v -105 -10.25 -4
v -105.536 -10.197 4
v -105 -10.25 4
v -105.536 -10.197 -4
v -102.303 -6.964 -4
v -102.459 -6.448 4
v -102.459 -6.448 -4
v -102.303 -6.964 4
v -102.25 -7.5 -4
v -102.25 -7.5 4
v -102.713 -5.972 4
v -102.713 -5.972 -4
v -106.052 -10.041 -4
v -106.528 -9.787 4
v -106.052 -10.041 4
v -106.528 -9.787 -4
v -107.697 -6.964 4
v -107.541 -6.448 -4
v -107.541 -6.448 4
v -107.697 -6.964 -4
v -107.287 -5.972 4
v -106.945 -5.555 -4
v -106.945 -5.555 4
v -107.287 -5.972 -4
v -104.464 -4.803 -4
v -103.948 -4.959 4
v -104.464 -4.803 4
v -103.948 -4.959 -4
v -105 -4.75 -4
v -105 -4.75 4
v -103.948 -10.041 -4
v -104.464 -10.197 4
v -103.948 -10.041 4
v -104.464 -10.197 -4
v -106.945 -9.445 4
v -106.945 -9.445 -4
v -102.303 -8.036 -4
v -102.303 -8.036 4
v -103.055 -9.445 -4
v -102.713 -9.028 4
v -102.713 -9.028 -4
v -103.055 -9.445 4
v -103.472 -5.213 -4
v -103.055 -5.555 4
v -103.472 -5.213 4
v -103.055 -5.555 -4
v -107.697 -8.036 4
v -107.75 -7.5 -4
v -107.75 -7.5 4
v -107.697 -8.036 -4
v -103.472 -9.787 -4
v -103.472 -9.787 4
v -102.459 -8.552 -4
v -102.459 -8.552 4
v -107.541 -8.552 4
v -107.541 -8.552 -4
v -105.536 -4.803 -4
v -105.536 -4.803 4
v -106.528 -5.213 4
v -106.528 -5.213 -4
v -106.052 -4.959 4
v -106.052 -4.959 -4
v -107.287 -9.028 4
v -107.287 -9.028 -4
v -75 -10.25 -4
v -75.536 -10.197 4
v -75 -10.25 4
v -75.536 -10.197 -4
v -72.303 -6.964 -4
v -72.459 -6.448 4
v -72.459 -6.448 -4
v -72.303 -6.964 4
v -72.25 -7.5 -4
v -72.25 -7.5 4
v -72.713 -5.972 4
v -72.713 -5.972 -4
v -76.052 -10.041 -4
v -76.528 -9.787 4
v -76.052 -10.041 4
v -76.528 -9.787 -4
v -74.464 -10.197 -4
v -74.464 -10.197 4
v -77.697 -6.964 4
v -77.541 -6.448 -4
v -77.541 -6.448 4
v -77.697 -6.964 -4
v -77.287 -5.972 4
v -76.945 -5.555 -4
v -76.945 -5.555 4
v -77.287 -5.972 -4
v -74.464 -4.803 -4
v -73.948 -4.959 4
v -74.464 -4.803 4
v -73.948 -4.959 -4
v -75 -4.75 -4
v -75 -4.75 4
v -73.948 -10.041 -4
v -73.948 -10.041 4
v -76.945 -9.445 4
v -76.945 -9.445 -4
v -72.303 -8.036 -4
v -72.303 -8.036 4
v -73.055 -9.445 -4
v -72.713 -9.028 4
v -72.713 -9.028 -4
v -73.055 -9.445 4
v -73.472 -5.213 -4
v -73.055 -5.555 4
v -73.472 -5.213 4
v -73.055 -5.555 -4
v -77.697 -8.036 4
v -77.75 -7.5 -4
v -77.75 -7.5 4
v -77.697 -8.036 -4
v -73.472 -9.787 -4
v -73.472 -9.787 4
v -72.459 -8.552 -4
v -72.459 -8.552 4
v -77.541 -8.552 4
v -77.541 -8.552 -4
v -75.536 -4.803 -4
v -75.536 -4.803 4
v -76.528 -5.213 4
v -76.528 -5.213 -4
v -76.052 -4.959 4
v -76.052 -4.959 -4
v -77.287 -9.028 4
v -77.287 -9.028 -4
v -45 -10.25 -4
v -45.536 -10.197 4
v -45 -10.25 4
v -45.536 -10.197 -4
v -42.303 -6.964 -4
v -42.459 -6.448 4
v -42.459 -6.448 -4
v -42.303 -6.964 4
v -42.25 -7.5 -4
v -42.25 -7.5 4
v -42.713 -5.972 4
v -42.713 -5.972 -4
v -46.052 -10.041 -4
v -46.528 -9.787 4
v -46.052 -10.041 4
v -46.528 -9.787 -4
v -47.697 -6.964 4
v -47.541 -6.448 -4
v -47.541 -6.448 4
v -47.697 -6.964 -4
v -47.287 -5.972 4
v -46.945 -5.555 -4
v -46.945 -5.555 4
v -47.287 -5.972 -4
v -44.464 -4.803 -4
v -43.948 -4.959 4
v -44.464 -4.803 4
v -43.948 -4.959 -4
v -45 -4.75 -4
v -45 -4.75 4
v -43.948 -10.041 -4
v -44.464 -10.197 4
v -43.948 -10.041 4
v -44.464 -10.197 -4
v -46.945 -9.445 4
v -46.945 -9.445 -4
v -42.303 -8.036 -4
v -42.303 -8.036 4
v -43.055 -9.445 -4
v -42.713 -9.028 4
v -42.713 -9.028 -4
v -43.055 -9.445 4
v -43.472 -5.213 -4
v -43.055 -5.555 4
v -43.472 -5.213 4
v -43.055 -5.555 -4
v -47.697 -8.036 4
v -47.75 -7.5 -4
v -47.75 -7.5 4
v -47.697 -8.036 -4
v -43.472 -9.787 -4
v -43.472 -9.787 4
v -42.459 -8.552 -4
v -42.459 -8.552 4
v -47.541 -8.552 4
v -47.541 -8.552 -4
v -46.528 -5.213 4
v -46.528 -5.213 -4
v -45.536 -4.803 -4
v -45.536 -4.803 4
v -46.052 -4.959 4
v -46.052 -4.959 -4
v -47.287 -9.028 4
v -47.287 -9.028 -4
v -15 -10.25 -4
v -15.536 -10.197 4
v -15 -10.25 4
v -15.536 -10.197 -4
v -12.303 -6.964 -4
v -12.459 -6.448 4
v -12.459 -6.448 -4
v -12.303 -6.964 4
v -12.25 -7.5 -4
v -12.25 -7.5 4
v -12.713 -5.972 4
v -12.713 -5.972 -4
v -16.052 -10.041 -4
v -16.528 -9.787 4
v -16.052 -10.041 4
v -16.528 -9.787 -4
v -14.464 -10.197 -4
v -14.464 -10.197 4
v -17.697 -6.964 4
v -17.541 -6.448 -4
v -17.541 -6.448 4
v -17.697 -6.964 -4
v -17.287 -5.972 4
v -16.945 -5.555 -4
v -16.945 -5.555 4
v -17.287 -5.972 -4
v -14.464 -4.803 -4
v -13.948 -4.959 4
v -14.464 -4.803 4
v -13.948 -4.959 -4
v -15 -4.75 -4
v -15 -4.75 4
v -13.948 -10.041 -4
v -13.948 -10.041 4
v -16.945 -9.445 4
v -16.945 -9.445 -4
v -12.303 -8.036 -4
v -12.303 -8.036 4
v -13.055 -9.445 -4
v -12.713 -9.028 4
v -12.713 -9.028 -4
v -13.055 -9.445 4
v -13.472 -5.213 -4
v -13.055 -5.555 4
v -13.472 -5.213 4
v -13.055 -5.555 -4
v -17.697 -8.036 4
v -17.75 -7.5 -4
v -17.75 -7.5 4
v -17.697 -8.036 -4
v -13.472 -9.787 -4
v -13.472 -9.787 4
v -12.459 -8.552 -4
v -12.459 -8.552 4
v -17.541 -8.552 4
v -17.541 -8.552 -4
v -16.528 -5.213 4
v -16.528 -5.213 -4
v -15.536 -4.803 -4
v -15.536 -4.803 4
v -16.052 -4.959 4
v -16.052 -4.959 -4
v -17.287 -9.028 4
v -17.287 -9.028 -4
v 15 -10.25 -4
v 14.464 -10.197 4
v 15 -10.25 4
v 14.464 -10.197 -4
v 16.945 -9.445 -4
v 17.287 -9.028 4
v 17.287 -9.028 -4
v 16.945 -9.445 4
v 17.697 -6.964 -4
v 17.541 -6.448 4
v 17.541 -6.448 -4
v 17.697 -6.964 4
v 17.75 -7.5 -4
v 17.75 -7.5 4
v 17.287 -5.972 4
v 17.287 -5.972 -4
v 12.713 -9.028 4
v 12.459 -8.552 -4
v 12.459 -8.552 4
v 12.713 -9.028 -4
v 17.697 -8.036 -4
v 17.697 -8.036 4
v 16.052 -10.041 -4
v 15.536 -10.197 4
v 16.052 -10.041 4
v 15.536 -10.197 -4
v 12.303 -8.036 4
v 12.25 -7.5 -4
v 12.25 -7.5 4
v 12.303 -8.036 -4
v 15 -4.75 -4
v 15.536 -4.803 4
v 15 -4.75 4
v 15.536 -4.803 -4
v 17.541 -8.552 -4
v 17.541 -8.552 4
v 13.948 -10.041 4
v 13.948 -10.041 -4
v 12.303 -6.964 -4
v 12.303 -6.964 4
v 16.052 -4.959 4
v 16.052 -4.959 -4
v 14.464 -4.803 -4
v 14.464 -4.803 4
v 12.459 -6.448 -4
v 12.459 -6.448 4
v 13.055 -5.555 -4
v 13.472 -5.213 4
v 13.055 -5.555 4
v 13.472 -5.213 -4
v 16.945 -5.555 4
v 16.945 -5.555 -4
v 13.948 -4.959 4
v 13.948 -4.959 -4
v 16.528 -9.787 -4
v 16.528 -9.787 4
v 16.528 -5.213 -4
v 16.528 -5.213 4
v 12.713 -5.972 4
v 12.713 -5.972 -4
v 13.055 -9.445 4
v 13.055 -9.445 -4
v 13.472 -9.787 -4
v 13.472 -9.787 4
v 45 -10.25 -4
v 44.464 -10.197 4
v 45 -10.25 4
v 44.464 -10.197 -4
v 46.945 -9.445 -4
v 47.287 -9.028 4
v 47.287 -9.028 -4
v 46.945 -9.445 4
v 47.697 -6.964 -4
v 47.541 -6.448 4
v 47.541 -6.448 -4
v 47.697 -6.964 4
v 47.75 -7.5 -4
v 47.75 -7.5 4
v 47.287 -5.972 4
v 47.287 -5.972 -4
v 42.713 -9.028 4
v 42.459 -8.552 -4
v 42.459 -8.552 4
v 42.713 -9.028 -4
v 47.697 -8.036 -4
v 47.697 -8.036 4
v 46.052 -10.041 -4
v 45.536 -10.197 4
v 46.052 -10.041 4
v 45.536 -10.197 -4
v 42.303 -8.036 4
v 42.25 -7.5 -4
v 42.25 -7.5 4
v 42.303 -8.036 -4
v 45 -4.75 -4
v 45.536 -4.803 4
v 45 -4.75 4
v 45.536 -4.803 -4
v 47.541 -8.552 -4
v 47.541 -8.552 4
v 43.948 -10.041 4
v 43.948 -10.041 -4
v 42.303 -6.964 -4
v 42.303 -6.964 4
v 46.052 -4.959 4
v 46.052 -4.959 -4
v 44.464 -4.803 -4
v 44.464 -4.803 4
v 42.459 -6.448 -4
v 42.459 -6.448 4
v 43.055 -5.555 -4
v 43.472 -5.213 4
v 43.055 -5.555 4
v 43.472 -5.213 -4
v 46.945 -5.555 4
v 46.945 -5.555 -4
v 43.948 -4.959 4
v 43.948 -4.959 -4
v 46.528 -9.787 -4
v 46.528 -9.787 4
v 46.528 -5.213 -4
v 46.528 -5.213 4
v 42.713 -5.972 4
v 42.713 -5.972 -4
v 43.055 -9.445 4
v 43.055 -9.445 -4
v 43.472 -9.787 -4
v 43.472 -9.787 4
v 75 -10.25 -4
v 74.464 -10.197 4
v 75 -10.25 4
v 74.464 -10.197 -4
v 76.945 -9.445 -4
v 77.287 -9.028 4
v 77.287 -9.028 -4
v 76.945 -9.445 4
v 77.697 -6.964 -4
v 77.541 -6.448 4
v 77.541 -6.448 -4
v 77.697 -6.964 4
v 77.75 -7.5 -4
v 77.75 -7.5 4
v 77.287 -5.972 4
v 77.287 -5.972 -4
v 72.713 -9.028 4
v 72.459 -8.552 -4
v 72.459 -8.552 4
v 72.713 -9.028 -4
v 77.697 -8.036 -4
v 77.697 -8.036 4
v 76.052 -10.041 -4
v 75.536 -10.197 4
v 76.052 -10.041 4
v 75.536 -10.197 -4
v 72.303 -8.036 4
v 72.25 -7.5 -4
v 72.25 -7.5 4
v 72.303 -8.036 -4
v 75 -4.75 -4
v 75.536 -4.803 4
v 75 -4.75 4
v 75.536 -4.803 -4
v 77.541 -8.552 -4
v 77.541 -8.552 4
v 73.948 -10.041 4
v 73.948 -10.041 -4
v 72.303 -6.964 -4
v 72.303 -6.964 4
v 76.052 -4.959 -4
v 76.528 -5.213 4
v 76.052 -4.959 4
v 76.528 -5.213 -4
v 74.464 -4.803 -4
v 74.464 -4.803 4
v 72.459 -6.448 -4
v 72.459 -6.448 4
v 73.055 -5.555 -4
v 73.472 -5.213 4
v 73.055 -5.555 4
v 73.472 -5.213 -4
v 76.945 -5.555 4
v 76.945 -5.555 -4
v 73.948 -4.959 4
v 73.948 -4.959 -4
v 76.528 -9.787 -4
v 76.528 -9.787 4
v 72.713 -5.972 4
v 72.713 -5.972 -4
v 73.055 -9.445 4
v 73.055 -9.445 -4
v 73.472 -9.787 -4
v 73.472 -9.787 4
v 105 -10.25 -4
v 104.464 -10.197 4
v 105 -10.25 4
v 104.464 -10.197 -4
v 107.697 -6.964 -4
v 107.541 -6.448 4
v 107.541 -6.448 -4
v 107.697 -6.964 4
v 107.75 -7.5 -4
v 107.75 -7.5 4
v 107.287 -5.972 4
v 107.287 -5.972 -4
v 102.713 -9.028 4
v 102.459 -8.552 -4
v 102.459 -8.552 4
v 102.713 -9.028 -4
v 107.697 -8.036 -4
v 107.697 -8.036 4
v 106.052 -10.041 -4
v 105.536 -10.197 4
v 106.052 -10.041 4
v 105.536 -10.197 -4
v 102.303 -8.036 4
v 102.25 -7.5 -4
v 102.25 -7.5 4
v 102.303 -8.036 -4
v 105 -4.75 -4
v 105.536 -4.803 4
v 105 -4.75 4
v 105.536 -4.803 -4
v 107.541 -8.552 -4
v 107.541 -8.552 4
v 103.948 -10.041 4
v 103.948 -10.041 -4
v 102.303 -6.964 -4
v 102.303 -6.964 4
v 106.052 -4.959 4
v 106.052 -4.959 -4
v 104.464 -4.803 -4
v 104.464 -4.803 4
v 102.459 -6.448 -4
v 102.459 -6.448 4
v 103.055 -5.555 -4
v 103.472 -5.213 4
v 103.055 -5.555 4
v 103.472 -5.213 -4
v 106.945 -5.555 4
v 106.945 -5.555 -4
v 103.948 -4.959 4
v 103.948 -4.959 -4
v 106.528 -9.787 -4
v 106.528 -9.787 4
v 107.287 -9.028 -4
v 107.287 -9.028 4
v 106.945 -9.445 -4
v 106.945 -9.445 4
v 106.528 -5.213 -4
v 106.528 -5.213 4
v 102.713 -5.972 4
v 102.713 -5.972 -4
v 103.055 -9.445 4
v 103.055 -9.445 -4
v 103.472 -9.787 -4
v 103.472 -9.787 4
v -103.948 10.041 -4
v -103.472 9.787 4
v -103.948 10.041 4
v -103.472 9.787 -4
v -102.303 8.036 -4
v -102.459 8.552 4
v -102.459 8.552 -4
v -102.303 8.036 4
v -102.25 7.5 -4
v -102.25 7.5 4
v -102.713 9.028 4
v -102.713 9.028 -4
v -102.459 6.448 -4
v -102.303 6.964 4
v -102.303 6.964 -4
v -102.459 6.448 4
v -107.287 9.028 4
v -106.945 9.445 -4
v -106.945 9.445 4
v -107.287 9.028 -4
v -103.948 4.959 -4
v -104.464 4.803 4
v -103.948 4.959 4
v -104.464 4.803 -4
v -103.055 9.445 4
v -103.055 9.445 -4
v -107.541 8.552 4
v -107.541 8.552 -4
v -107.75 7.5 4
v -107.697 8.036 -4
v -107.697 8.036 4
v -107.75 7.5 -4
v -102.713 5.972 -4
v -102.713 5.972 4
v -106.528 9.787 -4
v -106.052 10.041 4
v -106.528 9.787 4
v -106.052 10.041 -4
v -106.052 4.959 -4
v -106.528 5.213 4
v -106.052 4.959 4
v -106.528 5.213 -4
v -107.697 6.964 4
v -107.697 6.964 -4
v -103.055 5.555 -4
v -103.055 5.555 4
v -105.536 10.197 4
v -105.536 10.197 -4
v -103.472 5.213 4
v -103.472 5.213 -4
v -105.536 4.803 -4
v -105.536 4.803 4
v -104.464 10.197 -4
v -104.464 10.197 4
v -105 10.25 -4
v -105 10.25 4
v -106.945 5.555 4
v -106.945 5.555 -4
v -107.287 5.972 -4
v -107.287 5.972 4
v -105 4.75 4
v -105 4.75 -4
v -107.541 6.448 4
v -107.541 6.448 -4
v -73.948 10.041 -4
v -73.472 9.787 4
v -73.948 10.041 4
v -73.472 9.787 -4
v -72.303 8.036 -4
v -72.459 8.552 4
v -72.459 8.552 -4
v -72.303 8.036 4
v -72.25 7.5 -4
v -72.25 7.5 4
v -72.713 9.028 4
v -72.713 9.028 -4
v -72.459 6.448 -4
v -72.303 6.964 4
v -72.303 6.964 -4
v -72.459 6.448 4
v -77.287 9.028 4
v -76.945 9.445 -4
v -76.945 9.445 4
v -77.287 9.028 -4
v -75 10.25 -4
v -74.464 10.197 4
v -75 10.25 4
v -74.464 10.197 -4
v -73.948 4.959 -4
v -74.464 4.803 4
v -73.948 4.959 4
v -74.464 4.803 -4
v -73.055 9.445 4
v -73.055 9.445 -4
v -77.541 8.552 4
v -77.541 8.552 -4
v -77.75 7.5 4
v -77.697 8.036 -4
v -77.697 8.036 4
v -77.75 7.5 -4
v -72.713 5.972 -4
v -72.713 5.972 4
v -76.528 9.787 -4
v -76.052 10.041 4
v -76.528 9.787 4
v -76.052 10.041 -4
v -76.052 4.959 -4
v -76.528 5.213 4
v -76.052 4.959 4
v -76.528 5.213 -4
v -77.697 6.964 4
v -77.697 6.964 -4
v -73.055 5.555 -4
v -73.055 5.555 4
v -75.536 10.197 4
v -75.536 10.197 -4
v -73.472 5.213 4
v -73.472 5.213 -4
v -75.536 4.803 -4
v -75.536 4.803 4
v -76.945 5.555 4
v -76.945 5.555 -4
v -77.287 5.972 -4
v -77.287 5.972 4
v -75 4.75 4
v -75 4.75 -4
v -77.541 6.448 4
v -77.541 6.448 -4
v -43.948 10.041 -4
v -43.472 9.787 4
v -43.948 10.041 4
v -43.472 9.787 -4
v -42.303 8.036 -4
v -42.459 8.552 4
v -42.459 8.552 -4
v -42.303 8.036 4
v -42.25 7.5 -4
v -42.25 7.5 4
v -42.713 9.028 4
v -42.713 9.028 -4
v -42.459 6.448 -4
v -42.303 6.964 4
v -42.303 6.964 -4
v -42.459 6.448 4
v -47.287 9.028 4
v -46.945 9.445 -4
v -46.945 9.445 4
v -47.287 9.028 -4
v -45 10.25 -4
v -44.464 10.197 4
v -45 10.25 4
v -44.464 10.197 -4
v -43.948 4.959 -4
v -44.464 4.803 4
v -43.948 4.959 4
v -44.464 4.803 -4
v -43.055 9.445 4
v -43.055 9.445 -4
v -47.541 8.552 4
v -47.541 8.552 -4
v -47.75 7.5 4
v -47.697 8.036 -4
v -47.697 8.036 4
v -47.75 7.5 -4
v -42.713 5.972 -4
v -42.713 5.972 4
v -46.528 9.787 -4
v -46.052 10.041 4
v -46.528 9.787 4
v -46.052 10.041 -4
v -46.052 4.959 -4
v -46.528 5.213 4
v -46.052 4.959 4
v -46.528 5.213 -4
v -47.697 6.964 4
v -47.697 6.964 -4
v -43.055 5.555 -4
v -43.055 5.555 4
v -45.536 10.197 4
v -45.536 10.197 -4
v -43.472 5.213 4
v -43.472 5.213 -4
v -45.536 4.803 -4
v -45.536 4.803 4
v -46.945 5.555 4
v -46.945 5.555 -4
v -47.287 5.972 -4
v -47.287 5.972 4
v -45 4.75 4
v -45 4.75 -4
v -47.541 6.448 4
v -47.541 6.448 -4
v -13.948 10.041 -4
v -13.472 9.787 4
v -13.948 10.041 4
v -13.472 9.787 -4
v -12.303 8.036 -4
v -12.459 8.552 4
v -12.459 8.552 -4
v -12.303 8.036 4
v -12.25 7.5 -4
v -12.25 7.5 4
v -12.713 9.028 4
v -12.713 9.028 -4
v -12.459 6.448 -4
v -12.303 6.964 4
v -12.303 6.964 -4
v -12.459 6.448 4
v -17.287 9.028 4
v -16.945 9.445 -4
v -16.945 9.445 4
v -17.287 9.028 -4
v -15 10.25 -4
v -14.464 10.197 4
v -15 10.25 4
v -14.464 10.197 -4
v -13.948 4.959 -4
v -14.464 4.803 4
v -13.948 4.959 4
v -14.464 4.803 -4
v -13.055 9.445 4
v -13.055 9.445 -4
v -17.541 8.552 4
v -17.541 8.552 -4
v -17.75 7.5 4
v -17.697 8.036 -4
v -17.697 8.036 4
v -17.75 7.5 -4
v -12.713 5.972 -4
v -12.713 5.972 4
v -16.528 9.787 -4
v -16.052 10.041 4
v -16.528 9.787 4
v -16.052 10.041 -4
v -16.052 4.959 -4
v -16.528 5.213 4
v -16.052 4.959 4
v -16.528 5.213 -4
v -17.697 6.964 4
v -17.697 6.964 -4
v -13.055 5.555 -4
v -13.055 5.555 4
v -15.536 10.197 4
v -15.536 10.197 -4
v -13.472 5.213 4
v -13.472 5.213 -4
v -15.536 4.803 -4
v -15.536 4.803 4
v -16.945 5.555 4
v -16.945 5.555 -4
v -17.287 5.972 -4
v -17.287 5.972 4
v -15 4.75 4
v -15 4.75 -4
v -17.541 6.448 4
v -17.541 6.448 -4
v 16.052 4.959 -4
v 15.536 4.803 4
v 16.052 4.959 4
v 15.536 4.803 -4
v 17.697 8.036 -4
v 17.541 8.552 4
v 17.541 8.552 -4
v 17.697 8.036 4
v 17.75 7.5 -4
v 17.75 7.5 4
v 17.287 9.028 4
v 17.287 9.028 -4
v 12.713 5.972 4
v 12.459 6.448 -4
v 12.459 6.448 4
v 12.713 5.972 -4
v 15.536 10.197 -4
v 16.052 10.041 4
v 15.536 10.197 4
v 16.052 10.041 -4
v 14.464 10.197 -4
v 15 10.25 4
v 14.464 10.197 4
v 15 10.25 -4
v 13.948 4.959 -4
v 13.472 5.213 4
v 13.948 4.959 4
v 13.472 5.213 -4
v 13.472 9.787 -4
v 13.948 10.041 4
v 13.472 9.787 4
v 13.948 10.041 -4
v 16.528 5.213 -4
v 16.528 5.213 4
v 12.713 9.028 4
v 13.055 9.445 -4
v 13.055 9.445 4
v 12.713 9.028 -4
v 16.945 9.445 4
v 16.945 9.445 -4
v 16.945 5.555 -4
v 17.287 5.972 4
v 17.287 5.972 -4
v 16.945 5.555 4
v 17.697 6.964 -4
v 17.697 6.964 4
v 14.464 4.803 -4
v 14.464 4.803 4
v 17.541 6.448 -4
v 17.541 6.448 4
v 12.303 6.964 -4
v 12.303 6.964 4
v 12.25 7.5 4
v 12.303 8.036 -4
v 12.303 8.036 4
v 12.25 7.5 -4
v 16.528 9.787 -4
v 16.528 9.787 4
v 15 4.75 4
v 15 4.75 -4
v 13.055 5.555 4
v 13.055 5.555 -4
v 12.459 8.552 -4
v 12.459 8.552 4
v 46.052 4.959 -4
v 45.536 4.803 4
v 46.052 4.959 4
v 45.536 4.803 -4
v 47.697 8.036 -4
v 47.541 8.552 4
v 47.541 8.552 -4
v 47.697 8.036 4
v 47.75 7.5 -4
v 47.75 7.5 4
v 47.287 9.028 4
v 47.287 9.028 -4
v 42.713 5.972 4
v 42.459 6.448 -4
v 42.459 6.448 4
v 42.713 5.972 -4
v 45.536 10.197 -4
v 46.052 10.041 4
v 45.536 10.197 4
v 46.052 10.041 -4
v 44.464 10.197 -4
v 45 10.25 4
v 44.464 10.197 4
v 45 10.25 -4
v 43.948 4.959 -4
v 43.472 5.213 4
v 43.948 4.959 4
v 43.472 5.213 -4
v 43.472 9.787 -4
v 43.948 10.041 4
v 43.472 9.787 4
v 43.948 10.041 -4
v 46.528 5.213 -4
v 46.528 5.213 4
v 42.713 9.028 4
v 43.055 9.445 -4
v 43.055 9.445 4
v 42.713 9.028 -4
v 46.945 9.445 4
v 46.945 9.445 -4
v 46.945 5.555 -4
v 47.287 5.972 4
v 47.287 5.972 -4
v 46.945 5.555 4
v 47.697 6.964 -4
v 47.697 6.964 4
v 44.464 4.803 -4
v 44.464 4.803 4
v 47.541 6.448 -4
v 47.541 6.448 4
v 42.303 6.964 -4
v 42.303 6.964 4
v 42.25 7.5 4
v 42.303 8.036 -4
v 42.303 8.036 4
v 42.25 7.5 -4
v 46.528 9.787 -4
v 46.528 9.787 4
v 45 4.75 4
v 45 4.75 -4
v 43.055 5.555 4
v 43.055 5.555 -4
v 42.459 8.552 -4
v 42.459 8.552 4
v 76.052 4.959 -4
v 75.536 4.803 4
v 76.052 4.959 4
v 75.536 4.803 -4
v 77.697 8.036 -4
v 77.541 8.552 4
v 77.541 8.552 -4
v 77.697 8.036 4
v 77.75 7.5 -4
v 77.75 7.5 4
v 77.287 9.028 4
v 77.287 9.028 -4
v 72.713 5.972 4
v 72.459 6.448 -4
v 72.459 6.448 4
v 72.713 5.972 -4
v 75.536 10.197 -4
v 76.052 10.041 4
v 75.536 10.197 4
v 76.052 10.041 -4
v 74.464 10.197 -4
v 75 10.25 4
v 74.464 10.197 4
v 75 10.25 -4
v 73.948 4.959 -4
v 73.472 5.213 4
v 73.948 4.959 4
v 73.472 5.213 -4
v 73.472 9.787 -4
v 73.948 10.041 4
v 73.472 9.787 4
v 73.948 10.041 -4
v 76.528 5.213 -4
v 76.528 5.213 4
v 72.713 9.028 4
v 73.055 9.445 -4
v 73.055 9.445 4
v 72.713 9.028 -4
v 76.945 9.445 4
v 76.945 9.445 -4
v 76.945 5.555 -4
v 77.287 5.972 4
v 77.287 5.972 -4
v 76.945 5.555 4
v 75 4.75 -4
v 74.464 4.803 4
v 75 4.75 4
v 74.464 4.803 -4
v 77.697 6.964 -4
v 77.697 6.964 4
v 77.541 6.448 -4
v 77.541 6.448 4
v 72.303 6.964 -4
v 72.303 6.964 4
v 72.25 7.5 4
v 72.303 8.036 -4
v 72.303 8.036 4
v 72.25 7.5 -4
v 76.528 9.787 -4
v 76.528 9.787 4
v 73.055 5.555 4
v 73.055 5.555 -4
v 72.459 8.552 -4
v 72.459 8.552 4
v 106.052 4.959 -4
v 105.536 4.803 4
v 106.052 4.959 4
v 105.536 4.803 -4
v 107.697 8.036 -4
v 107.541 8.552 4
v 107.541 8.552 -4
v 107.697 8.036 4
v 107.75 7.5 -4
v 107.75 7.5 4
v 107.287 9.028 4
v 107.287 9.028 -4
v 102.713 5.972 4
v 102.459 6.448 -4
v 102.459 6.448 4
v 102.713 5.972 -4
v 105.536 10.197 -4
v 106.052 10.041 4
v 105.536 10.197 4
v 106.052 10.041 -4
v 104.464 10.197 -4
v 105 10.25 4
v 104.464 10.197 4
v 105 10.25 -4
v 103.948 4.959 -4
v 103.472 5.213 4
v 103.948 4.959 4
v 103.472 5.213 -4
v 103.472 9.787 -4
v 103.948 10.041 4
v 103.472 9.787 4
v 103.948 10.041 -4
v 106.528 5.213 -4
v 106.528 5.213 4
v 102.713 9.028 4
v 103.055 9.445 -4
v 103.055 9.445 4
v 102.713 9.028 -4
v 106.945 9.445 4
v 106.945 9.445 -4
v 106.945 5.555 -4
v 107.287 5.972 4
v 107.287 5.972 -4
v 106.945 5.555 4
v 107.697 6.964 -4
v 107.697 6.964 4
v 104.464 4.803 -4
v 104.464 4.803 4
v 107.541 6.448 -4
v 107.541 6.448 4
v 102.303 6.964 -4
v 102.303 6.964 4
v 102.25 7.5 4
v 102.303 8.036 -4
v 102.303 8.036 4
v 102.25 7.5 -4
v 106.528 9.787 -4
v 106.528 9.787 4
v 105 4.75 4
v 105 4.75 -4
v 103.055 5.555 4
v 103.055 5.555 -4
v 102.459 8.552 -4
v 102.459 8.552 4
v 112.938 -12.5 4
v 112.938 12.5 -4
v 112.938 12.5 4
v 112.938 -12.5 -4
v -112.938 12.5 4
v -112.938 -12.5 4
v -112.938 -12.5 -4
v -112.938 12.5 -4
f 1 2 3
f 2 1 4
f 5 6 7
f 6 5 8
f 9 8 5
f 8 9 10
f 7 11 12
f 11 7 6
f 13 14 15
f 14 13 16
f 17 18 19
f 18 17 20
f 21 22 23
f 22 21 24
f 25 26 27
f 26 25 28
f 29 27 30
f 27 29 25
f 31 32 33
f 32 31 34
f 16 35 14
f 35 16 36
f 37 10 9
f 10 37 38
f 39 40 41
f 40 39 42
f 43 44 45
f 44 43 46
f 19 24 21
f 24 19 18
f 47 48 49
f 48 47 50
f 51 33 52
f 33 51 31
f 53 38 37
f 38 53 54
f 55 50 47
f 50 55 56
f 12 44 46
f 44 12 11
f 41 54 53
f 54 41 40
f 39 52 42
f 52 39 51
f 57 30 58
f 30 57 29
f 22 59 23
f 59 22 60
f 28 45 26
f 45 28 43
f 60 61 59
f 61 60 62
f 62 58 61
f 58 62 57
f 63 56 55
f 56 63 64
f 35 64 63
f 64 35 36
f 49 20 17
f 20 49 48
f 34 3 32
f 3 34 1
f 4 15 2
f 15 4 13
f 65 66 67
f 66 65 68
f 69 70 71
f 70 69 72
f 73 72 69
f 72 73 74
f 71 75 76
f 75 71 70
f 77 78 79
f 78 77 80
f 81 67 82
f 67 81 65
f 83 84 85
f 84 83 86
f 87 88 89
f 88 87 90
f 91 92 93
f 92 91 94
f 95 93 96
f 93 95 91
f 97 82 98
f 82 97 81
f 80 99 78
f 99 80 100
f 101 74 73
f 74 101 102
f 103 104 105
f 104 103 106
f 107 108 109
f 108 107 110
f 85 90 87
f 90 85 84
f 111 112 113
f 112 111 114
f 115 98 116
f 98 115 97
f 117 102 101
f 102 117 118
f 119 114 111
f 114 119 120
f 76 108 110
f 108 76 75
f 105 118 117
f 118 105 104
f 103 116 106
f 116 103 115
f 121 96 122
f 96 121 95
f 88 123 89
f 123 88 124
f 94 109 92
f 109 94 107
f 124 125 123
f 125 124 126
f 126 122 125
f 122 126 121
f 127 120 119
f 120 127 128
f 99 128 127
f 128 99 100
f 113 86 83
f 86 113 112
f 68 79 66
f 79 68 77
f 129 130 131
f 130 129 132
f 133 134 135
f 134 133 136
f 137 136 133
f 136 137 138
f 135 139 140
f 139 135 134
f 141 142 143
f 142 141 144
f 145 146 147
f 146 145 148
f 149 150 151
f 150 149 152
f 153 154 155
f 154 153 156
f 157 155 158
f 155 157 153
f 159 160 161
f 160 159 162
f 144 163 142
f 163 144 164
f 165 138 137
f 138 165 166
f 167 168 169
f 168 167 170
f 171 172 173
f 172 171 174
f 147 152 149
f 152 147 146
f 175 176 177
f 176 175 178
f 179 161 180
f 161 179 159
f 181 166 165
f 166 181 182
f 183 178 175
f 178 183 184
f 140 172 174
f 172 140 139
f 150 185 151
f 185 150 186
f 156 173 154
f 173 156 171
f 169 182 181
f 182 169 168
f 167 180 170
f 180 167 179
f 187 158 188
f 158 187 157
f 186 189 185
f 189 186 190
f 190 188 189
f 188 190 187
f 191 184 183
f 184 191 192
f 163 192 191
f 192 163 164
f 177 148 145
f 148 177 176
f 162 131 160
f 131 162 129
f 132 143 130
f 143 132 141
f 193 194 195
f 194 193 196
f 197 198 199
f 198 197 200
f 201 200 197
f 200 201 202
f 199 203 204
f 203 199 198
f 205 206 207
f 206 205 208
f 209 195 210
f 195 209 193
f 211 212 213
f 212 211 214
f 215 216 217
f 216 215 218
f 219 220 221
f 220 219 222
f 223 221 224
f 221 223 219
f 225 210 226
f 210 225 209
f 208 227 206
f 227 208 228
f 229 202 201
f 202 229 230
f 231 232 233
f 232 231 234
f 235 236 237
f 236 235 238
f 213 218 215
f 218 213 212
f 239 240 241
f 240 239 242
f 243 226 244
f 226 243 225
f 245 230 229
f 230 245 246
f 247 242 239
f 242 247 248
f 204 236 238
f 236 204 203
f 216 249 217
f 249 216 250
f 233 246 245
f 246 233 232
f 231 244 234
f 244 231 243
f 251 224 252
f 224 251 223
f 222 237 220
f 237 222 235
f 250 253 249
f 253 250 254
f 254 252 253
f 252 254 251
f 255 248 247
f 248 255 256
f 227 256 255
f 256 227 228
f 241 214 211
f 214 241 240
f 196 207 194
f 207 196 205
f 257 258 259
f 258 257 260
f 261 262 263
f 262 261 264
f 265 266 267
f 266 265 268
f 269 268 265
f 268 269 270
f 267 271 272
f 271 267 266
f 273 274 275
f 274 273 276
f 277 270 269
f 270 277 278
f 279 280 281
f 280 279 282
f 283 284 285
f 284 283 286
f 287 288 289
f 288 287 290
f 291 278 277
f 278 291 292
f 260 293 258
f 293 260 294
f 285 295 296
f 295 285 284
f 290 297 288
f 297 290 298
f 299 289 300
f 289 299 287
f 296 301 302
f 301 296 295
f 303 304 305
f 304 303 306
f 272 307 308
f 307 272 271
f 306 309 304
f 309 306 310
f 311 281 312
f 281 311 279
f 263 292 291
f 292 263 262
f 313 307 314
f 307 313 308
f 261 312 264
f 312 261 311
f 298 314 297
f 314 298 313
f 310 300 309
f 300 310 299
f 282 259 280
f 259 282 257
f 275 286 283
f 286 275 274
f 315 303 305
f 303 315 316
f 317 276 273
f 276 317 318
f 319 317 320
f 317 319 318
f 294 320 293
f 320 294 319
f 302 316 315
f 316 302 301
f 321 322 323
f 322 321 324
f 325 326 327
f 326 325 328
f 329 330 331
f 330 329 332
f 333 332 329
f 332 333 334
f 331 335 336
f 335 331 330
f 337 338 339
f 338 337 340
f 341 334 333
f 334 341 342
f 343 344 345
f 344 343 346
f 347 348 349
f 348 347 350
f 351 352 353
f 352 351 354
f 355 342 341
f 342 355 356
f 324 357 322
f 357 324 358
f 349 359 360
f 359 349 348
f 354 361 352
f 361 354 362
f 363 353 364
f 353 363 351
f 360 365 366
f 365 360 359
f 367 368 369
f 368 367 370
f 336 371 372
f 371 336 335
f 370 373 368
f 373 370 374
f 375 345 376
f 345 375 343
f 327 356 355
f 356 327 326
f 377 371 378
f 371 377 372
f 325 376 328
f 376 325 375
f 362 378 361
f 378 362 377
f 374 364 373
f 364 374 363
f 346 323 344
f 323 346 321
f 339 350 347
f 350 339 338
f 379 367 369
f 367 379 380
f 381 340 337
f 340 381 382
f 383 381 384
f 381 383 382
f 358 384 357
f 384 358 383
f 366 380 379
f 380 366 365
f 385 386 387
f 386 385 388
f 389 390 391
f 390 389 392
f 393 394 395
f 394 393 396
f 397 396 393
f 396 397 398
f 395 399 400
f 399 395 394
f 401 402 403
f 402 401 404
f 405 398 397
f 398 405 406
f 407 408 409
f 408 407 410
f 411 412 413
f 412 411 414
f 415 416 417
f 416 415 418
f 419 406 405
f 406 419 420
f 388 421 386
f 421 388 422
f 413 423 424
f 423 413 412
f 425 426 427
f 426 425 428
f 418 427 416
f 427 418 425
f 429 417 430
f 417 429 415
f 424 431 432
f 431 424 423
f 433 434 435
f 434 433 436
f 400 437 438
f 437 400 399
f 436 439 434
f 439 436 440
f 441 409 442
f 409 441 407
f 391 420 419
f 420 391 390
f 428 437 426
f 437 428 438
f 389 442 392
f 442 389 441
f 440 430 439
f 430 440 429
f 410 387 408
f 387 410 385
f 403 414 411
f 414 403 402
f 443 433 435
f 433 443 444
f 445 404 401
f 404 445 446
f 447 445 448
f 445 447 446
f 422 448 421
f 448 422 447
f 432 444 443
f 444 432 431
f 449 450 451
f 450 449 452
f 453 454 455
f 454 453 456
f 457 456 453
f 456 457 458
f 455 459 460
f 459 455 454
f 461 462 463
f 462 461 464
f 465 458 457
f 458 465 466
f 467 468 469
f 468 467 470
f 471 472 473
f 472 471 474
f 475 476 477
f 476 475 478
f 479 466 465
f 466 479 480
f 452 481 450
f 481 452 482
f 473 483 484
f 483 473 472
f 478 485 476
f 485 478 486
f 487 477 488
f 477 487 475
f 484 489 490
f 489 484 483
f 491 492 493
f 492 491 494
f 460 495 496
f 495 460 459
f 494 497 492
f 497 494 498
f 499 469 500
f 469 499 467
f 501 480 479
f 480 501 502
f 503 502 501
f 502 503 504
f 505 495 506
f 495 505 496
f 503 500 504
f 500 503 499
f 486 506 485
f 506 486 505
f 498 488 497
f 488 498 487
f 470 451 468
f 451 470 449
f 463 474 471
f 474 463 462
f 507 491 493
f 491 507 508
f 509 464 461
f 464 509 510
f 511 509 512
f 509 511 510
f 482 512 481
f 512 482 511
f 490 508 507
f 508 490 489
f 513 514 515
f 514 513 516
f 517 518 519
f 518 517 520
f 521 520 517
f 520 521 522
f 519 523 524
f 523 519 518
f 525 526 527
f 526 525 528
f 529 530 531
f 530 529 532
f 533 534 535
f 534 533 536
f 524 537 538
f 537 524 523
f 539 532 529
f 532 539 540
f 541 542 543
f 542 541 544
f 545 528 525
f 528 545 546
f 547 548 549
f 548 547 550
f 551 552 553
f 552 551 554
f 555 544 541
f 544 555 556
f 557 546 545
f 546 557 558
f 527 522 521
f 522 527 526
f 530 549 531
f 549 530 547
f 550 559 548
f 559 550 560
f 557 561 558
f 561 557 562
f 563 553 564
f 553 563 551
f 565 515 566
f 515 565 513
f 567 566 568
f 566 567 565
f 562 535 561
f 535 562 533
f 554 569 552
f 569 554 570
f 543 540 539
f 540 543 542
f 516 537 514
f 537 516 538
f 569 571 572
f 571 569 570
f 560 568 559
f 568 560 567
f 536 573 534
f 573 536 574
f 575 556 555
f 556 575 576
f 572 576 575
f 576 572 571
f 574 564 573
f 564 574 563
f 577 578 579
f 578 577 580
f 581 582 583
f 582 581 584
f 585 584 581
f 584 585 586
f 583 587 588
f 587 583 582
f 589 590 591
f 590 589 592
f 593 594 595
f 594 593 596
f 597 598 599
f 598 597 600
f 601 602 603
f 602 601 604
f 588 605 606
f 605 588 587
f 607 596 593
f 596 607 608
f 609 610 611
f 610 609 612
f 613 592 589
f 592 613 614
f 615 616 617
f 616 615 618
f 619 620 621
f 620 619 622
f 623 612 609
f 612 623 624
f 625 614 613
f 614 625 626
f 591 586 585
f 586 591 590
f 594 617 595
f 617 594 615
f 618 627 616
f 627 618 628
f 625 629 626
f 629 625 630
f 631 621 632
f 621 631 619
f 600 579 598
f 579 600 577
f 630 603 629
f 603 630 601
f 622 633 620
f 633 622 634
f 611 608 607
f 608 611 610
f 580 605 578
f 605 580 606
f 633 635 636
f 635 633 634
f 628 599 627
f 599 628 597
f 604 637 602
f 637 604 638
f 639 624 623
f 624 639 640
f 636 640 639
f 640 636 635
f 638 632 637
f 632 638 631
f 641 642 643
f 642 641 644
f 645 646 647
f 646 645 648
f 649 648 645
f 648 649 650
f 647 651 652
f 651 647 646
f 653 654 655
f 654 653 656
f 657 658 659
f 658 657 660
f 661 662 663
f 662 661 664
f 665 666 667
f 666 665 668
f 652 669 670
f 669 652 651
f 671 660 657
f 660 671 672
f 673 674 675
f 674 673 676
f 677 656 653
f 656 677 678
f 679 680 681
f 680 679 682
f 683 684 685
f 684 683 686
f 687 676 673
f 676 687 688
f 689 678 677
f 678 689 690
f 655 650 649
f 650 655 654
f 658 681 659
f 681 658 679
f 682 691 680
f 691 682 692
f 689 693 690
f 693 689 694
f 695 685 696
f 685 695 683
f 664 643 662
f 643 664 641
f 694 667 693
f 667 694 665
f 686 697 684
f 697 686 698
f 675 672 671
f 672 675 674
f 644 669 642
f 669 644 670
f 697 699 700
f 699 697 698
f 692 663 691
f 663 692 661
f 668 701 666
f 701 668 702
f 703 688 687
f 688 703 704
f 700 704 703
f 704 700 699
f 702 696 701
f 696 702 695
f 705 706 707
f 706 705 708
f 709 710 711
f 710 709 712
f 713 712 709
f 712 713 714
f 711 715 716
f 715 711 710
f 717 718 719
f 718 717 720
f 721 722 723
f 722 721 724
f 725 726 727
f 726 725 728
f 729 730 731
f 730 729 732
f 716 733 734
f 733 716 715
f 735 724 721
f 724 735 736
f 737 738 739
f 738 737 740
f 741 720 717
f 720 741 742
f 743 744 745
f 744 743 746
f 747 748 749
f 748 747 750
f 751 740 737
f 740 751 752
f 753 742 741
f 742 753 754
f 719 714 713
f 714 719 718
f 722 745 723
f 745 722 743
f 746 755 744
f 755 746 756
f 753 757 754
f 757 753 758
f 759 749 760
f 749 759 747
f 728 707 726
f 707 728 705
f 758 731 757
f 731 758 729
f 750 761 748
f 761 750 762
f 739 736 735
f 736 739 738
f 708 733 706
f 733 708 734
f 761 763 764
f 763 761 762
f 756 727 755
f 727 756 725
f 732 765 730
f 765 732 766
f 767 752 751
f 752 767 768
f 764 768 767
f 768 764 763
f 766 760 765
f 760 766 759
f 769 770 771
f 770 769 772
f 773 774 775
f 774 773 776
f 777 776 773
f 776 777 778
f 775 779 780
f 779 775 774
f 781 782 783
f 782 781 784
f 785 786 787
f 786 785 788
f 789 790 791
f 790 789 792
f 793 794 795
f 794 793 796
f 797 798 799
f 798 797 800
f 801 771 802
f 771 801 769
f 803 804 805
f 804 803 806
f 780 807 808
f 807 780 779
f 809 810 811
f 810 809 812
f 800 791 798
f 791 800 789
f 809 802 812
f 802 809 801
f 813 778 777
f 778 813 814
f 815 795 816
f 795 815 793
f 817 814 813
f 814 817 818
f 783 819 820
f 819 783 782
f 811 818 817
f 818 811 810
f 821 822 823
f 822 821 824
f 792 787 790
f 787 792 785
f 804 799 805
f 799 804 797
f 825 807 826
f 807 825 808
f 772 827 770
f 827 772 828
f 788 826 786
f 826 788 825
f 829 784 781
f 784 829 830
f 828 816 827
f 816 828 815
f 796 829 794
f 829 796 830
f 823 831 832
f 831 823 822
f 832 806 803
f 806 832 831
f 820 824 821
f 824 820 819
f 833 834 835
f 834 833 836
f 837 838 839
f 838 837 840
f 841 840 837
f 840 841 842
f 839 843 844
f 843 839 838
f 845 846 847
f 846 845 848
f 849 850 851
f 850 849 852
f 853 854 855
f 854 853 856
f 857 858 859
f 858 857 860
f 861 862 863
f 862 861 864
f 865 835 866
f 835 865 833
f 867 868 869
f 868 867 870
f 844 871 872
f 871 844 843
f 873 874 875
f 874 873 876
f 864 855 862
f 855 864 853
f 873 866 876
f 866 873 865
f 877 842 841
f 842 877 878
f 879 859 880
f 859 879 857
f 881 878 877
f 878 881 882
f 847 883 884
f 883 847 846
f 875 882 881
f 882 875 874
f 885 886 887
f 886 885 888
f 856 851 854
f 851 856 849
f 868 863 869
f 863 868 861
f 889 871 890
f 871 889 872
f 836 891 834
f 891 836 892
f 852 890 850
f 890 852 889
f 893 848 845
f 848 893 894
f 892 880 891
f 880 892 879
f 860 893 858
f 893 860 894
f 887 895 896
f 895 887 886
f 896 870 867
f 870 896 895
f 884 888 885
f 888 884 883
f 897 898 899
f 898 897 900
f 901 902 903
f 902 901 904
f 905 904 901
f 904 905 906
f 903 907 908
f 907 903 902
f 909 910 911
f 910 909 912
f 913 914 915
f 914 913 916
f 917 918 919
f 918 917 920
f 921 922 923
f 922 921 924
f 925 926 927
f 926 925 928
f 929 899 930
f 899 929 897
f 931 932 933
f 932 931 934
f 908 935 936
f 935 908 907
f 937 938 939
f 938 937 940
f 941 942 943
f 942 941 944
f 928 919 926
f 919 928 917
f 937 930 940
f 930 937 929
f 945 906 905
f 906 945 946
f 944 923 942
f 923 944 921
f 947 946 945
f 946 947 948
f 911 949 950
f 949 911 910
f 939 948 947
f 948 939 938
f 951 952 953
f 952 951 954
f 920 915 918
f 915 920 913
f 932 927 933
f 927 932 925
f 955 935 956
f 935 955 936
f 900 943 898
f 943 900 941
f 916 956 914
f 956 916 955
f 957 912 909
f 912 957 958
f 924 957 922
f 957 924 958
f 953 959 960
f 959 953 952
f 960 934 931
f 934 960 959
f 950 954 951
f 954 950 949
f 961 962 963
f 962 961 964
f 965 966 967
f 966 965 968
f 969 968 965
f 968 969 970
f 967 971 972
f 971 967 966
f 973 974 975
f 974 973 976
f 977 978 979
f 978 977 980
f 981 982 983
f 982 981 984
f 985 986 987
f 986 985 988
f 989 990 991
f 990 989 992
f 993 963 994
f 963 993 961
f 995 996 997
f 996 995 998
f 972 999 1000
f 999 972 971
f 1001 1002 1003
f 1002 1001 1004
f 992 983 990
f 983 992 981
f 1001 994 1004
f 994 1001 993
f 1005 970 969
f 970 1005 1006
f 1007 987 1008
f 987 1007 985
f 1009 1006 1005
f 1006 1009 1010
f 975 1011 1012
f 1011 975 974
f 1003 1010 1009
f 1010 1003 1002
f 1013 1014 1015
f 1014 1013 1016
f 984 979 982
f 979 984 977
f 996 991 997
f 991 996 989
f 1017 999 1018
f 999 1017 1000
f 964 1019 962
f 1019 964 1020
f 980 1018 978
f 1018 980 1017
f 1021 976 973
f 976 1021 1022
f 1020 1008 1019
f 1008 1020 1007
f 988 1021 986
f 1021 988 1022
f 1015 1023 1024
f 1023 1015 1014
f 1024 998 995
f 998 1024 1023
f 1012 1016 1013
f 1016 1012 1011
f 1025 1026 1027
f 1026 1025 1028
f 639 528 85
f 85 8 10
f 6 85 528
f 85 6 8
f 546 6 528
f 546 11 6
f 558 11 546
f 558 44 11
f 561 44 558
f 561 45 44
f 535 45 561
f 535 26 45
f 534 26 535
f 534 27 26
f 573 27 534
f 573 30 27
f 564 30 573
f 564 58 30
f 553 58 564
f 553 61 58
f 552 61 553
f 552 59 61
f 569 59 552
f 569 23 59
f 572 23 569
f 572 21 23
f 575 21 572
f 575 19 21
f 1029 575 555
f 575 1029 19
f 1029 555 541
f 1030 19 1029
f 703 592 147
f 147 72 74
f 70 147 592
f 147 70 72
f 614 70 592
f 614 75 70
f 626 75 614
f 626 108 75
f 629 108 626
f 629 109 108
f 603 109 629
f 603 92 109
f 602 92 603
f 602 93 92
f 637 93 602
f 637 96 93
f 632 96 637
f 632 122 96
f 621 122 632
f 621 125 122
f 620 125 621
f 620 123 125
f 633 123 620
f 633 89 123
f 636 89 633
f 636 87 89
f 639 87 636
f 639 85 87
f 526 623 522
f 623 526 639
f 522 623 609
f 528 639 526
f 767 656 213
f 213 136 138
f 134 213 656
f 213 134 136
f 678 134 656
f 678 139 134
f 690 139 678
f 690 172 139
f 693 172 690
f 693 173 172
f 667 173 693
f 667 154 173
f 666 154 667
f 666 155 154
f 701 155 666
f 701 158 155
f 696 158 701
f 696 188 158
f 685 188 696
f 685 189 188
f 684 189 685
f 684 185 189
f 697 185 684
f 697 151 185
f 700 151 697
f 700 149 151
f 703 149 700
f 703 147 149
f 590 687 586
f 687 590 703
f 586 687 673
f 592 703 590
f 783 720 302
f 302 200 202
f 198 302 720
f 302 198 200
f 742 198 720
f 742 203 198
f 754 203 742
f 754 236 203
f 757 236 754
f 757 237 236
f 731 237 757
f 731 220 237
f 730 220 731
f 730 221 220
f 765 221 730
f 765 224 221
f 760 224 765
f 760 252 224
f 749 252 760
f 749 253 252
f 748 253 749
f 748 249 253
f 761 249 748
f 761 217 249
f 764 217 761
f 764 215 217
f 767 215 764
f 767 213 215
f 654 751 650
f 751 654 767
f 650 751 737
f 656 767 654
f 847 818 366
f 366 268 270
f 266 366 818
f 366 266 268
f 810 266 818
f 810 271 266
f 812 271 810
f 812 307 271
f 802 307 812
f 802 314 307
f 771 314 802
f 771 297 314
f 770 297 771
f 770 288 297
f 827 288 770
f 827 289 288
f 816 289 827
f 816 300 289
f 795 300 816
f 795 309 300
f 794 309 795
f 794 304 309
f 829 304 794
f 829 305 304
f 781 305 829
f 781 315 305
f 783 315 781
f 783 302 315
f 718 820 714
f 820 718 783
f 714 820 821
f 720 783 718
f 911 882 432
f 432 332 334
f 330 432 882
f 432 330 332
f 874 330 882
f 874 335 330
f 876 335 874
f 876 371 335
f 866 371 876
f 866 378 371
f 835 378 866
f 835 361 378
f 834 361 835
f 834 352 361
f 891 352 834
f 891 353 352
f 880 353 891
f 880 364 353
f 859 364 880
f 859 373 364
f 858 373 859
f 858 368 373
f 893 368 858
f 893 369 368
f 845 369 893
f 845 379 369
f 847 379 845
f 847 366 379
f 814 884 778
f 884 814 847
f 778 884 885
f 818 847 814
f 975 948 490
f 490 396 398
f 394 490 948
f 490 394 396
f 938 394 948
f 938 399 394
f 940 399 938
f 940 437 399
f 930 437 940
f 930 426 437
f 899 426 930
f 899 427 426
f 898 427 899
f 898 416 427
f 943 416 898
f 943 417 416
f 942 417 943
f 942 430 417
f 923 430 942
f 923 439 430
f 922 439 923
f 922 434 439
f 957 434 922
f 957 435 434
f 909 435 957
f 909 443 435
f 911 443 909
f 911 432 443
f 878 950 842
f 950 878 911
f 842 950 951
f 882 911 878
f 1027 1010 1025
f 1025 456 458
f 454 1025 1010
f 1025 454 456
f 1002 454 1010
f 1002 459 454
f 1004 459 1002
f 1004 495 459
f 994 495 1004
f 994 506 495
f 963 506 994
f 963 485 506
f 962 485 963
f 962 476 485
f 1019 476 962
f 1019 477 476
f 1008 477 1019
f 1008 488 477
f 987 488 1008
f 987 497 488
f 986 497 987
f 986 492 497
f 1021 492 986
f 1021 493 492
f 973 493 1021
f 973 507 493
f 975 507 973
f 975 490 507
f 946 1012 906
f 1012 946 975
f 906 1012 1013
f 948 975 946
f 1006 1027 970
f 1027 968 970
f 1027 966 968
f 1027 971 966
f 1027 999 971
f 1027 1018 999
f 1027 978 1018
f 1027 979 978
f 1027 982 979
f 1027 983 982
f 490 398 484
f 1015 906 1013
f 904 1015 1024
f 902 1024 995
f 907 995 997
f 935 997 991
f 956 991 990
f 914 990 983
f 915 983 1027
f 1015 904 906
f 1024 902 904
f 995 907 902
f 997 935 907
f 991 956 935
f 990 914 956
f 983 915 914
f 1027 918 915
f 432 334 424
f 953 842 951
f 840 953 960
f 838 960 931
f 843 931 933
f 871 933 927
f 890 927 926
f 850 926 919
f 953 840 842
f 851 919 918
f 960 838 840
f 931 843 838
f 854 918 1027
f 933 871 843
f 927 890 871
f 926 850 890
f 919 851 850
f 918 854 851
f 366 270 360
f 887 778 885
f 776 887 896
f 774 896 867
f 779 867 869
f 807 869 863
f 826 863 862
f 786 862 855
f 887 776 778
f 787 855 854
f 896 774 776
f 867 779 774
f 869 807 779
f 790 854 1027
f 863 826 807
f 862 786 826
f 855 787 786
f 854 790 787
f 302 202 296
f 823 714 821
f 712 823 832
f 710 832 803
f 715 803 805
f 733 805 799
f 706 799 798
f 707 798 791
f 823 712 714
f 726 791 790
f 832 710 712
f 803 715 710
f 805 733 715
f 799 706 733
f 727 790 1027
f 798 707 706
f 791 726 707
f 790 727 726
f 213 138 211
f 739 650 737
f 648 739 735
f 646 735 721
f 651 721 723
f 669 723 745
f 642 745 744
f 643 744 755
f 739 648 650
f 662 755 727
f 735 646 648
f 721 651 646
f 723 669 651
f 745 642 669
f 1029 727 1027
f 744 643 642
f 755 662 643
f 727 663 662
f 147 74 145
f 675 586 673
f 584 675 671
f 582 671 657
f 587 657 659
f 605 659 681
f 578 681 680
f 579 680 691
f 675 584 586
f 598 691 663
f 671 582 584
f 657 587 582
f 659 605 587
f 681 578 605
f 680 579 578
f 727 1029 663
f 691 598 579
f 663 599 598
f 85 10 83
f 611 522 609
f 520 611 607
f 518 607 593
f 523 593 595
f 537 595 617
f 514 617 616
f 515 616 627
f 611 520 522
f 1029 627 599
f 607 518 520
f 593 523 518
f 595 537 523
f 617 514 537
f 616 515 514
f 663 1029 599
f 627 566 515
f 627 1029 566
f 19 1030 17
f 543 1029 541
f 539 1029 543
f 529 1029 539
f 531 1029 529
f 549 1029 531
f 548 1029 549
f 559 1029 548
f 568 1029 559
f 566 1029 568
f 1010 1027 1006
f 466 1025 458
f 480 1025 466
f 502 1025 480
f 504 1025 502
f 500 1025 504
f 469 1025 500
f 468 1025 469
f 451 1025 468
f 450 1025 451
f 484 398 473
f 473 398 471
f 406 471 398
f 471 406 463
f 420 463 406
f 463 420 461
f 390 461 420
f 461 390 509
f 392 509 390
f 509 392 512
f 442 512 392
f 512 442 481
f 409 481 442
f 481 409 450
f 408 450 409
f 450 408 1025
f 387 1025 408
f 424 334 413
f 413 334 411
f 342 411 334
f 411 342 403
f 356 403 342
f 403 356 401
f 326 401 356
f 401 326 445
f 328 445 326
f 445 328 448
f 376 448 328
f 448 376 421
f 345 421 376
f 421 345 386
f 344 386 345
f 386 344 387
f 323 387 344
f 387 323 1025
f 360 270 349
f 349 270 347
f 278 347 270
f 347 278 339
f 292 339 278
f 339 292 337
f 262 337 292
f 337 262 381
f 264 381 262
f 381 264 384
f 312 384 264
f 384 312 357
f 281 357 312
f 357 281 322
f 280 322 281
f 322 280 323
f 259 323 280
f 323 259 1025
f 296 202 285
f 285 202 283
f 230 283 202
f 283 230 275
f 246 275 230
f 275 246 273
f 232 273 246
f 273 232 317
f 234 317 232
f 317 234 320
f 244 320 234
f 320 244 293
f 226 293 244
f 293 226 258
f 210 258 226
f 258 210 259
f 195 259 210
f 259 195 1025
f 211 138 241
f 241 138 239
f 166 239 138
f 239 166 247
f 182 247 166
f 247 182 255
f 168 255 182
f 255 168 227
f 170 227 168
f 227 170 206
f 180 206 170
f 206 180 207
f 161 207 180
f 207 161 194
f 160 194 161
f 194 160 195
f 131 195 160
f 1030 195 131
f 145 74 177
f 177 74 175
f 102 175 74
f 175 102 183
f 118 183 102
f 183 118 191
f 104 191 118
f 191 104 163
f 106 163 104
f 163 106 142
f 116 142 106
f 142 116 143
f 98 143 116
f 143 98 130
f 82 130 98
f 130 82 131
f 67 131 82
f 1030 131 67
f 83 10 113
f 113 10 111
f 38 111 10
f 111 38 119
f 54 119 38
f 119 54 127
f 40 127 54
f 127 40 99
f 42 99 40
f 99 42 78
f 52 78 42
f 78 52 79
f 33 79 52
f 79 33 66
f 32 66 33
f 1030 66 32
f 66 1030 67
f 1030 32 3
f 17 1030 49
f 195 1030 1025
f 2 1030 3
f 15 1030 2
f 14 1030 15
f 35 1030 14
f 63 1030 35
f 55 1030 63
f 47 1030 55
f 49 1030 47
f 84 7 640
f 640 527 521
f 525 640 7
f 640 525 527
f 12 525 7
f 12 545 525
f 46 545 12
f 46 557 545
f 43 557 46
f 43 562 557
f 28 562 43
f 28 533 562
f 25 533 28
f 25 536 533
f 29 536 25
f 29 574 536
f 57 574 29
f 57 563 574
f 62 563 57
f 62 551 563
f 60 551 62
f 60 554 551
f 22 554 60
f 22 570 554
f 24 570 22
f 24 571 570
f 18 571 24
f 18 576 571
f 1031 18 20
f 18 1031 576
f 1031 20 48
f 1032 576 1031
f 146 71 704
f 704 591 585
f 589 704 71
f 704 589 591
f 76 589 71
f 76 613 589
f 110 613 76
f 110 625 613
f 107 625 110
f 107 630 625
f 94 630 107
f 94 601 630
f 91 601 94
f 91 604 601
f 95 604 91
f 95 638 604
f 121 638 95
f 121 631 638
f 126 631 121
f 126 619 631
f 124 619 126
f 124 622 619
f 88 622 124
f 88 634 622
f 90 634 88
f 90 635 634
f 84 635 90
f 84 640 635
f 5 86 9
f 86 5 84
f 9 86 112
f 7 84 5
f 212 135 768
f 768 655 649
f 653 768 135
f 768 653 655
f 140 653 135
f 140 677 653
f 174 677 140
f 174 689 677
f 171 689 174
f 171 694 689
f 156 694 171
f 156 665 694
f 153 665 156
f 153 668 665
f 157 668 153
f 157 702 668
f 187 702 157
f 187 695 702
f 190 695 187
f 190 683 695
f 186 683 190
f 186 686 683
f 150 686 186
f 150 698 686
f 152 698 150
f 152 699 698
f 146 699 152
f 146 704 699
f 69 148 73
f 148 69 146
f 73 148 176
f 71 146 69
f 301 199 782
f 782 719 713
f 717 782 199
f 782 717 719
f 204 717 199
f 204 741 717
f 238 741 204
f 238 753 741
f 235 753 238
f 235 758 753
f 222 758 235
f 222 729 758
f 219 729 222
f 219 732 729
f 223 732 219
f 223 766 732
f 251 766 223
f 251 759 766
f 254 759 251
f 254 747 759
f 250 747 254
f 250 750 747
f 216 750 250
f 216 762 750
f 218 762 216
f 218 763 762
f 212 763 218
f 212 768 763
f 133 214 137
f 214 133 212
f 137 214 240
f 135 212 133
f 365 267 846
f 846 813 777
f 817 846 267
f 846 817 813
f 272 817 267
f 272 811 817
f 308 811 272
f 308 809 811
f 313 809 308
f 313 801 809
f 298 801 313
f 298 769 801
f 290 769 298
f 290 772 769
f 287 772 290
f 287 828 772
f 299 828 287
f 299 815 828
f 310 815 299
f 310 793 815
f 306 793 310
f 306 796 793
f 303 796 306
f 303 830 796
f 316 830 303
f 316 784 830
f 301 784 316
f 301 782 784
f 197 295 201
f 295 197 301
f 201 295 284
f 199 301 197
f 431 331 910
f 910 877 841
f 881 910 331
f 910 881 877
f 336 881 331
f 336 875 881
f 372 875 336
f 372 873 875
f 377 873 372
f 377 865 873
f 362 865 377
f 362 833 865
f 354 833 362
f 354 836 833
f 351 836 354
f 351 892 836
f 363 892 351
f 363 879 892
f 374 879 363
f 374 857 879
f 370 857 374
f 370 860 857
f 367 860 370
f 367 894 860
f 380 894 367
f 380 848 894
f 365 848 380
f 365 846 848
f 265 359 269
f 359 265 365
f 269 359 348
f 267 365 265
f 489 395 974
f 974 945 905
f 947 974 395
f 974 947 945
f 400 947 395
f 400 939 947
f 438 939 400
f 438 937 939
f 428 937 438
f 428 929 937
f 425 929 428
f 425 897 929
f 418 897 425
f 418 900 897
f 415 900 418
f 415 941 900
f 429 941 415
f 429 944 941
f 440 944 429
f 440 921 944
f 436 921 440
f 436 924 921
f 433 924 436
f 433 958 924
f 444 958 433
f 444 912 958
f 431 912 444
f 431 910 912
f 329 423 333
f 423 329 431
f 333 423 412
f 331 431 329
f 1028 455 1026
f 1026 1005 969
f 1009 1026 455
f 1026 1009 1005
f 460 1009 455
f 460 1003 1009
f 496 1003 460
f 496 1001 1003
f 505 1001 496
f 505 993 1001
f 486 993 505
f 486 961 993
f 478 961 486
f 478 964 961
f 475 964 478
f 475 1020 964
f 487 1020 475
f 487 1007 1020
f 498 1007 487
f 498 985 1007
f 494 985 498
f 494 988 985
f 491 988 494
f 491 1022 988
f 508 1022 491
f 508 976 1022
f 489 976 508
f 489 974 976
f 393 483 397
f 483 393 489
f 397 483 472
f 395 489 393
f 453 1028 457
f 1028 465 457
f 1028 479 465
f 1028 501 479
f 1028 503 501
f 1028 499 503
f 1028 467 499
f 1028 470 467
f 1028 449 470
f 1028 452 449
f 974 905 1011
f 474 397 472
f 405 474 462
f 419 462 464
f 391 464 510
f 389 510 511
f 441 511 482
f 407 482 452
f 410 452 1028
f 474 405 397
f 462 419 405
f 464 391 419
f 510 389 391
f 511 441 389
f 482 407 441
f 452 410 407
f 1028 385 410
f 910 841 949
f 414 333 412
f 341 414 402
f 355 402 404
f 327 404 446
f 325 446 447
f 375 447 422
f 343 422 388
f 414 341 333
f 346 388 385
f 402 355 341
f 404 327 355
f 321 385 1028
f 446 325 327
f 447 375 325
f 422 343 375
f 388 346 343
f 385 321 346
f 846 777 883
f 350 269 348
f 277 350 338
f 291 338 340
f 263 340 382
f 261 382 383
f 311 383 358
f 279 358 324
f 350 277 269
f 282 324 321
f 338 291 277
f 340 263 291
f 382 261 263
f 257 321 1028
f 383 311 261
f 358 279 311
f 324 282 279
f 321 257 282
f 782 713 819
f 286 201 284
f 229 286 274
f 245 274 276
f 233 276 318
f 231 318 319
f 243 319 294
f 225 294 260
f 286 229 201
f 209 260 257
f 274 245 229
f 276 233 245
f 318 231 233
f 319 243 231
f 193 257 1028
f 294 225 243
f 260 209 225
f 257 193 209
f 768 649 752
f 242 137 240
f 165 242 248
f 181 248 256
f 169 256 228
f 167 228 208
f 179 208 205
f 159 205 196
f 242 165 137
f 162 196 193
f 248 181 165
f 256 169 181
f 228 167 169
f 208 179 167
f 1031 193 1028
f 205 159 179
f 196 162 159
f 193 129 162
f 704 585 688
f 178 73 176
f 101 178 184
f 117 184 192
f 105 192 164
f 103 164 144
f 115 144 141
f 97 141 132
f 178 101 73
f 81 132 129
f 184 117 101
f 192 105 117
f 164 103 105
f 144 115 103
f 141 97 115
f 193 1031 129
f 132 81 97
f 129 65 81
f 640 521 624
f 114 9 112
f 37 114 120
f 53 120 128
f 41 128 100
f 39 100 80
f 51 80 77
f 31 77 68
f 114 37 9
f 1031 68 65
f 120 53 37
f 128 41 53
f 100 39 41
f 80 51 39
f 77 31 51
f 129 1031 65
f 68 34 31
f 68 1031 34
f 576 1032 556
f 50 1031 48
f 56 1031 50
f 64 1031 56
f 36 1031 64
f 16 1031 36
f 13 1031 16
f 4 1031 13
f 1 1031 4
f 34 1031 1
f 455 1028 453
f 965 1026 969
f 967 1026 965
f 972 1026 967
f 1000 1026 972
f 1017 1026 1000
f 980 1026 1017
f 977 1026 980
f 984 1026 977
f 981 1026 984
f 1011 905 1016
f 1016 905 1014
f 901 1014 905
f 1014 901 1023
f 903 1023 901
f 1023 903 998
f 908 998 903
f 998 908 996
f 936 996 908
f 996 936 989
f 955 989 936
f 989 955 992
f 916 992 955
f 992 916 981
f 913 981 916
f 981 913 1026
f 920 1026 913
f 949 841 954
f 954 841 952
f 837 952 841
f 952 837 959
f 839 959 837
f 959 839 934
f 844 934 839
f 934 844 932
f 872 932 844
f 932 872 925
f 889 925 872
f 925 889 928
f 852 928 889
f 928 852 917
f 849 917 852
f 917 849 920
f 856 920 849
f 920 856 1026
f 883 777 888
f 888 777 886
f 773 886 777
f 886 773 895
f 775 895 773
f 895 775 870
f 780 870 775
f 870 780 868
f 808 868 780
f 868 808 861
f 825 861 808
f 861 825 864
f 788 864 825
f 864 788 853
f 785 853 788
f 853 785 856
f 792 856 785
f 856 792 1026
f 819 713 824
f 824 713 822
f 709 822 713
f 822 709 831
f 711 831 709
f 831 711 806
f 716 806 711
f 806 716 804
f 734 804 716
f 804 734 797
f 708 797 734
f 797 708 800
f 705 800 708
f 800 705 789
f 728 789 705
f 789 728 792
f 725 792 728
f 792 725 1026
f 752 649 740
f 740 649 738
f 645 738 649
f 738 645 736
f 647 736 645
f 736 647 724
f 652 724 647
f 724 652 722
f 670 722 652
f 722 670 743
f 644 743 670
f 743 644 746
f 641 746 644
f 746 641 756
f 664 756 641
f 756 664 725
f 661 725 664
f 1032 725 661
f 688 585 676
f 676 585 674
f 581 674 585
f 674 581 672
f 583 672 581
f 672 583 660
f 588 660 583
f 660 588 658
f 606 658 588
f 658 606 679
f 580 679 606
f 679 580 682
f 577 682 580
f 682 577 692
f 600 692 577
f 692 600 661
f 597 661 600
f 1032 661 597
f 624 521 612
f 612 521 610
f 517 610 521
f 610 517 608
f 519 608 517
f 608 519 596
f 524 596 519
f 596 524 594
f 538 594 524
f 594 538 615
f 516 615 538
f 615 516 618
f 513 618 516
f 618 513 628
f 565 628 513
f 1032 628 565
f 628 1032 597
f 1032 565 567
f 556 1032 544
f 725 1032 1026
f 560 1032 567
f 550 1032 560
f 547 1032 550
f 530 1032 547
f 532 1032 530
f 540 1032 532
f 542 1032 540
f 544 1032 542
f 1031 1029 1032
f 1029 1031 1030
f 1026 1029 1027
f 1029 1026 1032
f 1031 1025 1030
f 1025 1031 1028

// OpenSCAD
$fn = 32;

// ----------------------------------------------------------------------
// Hole bar, 8 x Ø5.5
// tworows layout, 7.9375 mm edge offset
// ----------------------------------------------------------------------

// --- parameters (mm) ---
bar_w = 25;       // bar width (Y)
bar_t = 8;        // bar thickness (Z)
holes = 8;        // holes per row
hole_d = 5.5;     // hole diameter
edge = 7.938;     // offset from the bar end to the first hole
pitch = 30;       // pitch between neighbouring holes
row_offset = 15;  // distance between the two rows

// --- derived feature positions (mm) ---
span = (holes - 1) * pitch;   // = 210   distance between the end holes
bar_l = span + 2 * edge;      // = 225.88   overall bar length
start_x = -bar_l / 2 + edge;  // = -105   X of the first hole
feature_centers = [
  [start_x + 0 * pitch, -row_offset / 2],
  [start_x + 1 * pitch, -row_offset / 2],
  [start_x + 2 * pitch, -row_offset / 2],
  [start_x + 3 * pitch, -row_offset / 2],
  [start_x + 4 * pitch, -row_offset / 2],
  [start_x + 5 * pitch, -row_offset / 2],
  [start_x + 6 * pitch, -row_offset / 2],
  [start_x + 7 * pitch, -row_offset / 2]
];   // hole centres of the first row
row2_centers = [
  [start_x + 0 * pitch, row_offset / 2],
  [start_x + 1 * pitch, row_offset / 2],
  [start_x + 2 * pitch, row_offset / 2],
  [start_x + 3 * pitch, row_offset / 2],
  [start_x + 4 * pitch, row_offset / 2],
  [start_x + 5 * pitch, row_offset / 2],
  [start_x + 6 * pitch, row_offset / 2],
  [start_x + 7 * pitch, row_offset / 2]
];   // hole centres of the second row

// bar with two rows of holes, both read from their own centre arrays
difference() {
  translate([-bar_l / 2, -bar_w / 2, -bar_t / 2]) cube([bar_l, bar_w, bar_t]);
  for (centre = feature_centers)
    translate([centre[0], centre[1], 0])
      cylinder(d = hole_d, h = bar_t + 2, center = true);
  for (centre = row2_centers)
    translate([centre[0], centre[1], 0])
      cylinder(d = hole_d, h = bar_t + 2, center = true);
}
